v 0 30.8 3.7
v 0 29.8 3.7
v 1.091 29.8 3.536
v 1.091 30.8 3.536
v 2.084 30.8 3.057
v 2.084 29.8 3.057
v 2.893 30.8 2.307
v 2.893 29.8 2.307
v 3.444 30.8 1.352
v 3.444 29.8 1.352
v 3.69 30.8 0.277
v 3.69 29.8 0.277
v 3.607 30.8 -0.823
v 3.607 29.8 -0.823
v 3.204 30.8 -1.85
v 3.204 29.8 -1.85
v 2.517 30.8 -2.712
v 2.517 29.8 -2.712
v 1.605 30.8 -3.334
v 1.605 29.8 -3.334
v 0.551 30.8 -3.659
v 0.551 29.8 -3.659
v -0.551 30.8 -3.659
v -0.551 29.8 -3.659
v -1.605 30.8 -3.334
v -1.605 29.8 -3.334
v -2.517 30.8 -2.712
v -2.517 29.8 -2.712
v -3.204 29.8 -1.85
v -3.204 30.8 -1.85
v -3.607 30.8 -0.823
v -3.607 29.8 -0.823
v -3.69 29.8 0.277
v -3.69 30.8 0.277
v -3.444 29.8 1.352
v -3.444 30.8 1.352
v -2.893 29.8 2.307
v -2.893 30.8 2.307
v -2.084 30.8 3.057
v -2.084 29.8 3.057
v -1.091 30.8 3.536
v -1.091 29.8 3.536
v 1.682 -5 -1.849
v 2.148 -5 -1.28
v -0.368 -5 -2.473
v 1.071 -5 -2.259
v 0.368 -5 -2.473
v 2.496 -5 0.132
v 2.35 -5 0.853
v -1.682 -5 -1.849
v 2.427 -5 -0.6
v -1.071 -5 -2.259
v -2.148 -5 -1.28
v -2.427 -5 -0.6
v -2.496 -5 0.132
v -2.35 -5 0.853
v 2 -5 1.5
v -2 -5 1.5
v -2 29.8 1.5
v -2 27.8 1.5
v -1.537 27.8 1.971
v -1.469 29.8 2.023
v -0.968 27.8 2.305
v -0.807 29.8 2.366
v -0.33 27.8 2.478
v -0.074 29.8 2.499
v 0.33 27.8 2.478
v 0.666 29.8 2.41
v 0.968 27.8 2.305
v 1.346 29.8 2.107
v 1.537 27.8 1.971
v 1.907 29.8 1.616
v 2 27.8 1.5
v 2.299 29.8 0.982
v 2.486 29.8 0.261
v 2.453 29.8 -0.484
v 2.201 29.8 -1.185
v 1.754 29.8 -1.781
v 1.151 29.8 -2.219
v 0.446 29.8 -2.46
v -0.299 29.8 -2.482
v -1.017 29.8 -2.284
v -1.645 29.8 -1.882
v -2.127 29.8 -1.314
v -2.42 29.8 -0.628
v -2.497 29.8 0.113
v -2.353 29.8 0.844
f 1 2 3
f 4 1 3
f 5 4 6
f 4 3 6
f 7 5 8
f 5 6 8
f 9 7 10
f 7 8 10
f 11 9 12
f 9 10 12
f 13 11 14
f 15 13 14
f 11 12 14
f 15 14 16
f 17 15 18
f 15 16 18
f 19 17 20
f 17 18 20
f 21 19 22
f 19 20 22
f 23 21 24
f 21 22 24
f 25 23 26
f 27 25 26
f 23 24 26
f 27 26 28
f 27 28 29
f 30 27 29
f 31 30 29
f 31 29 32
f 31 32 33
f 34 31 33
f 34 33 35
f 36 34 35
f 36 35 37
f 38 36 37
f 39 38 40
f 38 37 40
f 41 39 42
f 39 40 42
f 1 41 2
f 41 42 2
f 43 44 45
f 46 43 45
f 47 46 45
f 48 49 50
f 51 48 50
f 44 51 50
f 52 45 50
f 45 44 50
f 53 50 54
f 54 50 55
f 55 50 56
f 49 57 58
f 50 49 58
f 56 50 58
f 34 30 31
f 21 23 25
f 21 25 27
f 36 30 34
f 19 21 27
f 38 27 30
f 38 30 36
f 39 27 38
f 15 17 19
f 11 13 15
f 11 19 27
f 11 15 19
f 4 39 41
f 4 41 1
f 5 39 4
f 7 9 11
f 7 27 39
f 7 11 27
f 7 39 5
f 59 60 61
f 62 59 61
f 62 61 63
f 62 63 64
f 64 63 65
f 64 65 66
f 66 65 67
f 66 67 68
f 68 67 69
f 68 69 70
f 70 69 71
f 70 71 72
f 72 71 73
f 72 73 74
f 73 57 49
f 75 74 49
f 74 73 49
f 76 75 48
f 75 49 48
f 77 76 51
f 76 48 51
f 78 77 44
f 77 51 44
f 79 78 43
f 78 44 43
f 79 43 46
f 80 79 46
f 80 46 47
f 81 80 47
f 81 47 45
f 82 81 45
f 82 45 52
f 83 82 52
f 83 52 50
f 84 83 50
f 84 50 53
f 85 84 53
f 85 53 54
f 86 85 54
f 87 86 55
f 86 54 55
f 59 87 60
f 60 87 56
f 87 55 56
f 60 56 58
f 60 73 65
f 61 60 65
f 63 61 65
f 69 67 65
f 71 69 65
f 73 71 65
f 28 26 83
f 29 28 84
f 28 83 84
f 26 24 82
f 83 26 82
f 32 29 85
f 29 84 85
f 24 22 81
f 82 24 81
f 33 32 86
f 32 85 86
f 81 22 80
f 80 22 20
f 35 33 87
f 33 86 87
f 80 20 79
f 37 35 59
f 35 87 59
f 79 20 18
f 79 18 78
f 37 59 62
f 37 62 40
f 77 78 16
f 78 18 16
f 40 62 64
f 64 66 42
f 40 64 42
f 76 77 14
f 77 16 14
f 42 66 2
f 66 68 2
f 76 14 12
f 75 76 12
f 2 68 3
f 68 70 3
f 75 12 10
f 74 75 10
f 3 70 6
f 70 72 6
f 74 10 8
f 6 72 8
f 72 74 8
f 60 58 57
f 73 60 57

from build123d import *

# Parameters (mm, degrees)
EXTRUDE_1_DEPTH = 27.8
SKETCH_2_R      = 2.5
EXTRUDE_2_DEPTH = 2
SKETCH_3_R      = 3.7
EXTRUDE_3_DEPTH = 1
EXTRUDE_START   = 2
EXTRUDE_4_DEPTH = 2
EXTRUDE_START_2 = 3
EXTRUDE_5_DEPTH = 3


with BuildPart() as part:
    # 草图1 → 凸台-拉伸1 (new body)
    with BuildSketch(Plane(origin=(0, 0, 0), x_dir=(1, 0, 0), z_dir=(0, 1, 0))):
        with BuildLine():
            Line((-2, -1.5), (2, -1.5))
            ThreePointArc((2, -1.5), (0, 2.5), (-2, -1.5))
        make_face()
    extrude(amount=EXTRUDE_1_DEPTH)

    # 草图2 → 凸台-拉伸2 (add)
    with BuildSketch(Plane(origin=(0, 27.8, 0), x_dir=(1, 0, 0), z_dir=(0, 1, 0))):
        with Locations(Location((0, 0, 0), (0, 0, 216.869897646))):
            Circle(SKETCH_2_R)
    extrude(amount=EXTRUDE_2_DEPTH)

    # 草图3 → 凸台-拉伸3 (add)
    with BuildSketch(Plane(origin=(0, 29.8, 0), x_dir=(1, 0, 0), z_dir=(0, 1, 0))):
        with Locations(Location((0, 0, 0), (0, 0, 270))):
            Circle(SKETCH_3_R)
    extrude(amount=EXTRUDE_3_DEPTH)

    # 草图4 → 凸台-拉伸4 (add)
    with BuildSketch(Plane.XZ.offset(EXTRUDE_START)):
        with BuildLine():
            Line((-2, 1.5), (2, 1.5))
            ThreePointArc((2, 1.5), (0, -2.5), (-2, 1.5))
        make_face()
    extrude(amount=-EXTRUDE_4_DEPTH)

    # 草图5 → 凸台-拉伸5 (add)
    with BuildSketch(Plane.XZ.offset(2).offset(EXTRUDE_START_2)):
        with BuildLine():
            Line((-2, 1.5), (2, 1.5))
            ThreePointArc((2, 1.5), (0, -2.5), (-2, 1.5))
        make_face()
    extrude(amount=-EXTRUDE_5_DEPTH)


solid = part.part
